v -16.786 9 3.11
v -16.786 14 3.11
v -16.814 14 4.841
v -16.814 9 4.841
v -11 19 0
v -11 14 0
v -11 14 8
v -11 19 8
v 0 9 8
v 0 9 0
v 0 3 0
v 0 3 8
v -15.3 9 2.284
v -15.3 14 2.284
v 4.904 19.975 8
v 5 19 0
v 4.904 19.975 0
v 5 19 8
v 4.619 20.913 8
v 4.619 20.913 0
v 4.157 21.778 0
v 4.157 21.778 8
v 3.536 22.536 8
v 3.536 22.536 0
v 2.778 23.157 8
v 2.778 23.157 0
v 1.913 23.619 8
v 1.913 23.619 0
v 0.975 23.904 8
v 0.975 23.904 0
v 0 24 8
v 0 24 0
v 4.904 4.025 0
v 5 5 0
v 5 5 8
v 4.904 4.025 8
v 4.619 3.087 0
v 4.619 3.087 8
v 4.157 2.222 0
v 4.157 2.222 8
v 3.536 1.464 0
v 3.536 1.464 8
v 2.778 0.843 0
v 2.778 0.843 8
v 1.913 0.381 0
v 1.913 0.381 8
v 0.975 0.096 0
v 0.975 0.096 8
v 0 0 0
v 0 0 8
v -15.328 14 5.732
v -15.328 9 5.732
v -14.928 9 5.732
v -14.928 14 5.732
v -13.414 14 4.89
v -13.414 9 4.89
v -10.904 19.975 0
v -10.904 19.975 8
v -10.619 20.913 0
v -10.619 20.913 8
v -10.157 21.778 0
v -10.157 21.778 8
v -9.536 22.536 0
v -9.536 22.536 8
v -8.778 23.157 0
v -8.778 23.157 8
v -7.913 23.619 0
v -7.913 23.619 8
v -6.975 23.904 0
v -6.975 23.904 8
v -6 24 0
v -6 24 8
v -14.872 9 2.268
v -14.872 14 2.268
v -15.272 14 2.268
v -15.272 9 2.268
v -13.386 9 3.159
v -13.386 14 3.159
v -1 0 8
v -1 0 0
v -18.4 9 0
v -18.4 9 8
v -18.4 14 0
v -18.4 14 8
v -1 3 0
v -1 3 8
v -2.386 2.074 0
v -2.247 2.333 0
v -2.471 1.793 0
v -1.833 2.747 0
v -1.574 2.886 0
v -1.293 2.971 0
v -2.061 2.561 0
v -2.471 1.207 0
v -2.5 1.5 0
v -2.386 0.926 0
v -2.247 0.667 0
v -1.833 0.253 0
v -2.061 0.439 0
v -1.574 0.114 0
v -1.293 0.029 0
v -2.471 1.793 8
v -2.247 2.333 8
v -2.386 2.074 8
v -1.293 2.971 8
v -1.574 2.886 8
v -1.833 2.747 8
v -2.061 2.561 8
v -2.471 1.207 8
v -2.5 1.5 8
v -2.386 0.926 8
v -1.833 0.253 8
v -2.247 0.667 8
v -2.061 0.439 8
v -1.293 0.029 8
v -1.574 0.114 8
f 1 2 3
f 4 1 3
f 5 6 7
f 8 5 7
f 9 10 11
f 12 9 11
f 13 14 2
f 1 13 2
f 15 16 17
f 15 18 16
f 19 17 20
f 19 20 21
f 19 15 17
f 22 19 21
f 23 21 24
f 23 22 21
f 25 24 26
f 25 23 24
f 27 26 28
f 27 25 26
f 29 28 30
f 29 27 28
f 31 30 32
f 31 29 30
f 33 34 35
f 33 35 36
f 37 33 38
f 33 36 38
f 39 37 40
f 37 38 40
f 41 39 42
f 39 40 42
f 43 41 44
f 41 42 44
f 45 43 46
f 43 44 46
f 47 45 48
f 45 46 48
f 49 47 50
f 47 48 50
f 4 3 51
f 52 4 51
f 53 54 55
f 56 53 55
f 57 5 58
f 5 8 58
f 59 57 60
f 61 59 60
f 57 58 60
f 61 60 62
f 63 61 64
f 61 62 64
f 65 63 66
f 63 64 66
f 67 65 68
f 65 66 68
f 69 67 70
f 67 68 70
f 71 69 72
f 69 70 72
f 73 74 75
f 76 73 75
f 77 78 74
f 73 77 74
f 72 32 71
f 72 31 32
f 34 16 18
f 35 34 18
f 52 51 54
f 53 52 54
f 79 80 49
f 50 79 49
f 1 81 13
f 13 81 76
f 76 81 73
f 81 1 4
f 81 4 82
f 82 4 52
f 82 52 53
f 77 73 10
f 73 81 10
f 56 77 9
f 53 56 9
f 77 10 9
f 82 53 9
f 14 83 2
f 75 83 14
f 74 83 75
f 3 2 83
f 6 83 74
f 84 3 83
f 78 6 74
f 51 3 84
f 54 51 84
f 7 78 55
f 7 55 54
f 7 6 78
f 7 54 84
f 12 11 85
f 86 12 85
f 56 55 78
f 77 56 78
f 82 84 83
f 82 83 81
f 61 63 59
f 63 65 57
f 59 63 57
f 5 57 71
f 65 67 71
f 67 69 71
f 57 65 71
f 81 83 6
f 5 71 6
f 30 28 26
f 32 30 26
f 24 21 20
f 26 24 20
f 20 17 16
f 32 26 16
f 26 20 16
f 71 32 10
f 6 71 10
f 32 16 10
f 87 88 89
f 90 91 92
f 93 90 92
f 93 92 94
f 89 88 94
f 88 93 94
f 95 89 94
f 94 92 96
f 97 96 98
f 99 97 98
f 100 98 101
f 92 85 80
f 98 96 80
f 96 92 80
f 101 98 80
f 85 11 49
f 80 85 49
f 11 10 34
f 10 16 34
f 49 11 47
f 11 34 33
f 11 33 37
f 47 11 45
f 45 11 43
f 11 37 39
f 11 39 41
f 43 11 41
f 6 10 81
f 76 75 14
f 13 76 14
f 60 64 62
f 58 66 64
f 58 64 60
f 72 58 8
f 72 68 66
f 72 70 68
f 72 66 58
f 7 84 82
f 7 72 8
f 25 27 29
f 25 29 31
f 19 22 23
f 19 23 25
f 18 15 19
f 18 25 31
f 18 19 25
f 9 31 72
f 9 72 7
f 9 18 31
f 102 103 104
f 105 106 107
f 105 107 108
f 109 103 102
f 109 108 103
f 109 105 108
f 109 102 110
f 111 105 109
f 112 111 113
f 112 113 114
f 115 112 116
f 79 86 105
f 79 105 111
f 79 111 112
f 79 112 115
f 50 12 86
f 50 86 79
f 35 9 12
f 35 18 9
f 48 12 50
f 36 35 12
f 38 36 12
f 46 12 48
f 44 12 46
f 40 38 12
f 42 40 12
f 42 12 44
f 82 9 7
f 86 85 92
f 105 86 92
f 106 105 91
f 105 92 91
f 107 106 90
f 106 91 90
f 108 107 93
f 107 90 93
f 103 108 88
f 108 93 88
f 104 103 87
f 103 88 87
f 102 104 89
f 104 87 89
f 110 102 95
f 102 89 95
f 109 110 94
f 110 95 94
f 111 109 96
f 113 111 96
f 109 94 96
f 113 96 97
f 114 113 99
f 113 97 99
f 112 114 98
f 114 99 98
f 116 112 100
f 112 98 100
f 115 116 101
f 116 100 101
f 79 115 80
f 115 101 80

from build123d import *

# Parameters (mm, degrees)
F1_DEPTH      = 8
F3_DEPTH      = 25
F3_DEPTH_BACK = 25
F4_W          = 16
F4_H          = 8
F5_DEPTH      = 10
F6_R          = 5
F7_R          = 5
F8_DEPTH      = 0.4


with BuildPart() as f1:
    # F0 (on Top) → F1 (new body)
    with BuildSketch(Plane.XY):
        with BuildLine():
            Line((-1, 0), (0, 0))
            Line((0, 0), (5, 0))
            Line((5, 0), (5, 14))
            Line((5, 14), (-18, 14))
            Line((-18, 14), (-18, 9))
            Line((-18, 9), (0, 9))
            Line((0, 9), (0, 3))
            Line((0, 3), (-1, 3))
            ThreePointArc((-1, 3), (-2.5, 1.5), (-1, 0))
        make_face()
    extrude(amount=F1_DEPTH)

    # F2 (on face) → F3 (cut, two sides)
    with BuildSketch(Plane(origin=(0, 14, 0), x_dir=(-1, 0, 0), z_dir=(0, 1, 0))) as f3_sk:
        Polygon((15.3, 2.2838863602), (15.3, 5.7318202537), (14.9282596673, 5.7318202537), (13.4143294991, 4.8903837167), (13.3860698318, 3.1585634629), (14.8717403327, 2.2681797463), (15.2717403327, 2.2681797463), align=None)
        Polygon((15.3282596673, 5.7318202537), (15.3, 5.7318202537), (15.3, 2.2838863602), (16.7856705009, 3.1096162833), (16.8139301682, 4.8414365371), align=None)
    extrude(amount=-F3_DEPTH, mode=Mode.SUBTRACT)
    extrude(f3_sk.sketch, amount=F3_DEPTH_BACK, mode=Mode.SUBTRACT)

    # F4 (on face) → F5 (join)
    with BuildSketch(Plane(origin=(0, 14, 0), x_dir=(-1, 0, 0), z_dir=(0, 1, 0))):
        with Locations((3, 4)):
            Rectangle(F4_W, F4_H)
    extrude(amount=F5_DEPTH)

    # F6
    f6_edges = [f1.edges().sort_by_distance(p)[0] for p in [
        (5, 24, 4),
        (-11, 24, 4),
    ]]
    fillet(f6_edges, radius=F6_R)

    # F7
    f7_edges = [f1.edges().sort_by_distance(p)[0] for p in [
        (5, 0, 4),
    ]]
    fillet(f7_edges, radius=F7_R)

    # F8 (add): a face of the model
    f8_faces = [f1.faces().sort_by_distance(p)[0] for p in [
        (-18, 11.5, 4),
    ]]
    extrude(f8_faces, amount=F8_DEPTH)


solid = f1.part
